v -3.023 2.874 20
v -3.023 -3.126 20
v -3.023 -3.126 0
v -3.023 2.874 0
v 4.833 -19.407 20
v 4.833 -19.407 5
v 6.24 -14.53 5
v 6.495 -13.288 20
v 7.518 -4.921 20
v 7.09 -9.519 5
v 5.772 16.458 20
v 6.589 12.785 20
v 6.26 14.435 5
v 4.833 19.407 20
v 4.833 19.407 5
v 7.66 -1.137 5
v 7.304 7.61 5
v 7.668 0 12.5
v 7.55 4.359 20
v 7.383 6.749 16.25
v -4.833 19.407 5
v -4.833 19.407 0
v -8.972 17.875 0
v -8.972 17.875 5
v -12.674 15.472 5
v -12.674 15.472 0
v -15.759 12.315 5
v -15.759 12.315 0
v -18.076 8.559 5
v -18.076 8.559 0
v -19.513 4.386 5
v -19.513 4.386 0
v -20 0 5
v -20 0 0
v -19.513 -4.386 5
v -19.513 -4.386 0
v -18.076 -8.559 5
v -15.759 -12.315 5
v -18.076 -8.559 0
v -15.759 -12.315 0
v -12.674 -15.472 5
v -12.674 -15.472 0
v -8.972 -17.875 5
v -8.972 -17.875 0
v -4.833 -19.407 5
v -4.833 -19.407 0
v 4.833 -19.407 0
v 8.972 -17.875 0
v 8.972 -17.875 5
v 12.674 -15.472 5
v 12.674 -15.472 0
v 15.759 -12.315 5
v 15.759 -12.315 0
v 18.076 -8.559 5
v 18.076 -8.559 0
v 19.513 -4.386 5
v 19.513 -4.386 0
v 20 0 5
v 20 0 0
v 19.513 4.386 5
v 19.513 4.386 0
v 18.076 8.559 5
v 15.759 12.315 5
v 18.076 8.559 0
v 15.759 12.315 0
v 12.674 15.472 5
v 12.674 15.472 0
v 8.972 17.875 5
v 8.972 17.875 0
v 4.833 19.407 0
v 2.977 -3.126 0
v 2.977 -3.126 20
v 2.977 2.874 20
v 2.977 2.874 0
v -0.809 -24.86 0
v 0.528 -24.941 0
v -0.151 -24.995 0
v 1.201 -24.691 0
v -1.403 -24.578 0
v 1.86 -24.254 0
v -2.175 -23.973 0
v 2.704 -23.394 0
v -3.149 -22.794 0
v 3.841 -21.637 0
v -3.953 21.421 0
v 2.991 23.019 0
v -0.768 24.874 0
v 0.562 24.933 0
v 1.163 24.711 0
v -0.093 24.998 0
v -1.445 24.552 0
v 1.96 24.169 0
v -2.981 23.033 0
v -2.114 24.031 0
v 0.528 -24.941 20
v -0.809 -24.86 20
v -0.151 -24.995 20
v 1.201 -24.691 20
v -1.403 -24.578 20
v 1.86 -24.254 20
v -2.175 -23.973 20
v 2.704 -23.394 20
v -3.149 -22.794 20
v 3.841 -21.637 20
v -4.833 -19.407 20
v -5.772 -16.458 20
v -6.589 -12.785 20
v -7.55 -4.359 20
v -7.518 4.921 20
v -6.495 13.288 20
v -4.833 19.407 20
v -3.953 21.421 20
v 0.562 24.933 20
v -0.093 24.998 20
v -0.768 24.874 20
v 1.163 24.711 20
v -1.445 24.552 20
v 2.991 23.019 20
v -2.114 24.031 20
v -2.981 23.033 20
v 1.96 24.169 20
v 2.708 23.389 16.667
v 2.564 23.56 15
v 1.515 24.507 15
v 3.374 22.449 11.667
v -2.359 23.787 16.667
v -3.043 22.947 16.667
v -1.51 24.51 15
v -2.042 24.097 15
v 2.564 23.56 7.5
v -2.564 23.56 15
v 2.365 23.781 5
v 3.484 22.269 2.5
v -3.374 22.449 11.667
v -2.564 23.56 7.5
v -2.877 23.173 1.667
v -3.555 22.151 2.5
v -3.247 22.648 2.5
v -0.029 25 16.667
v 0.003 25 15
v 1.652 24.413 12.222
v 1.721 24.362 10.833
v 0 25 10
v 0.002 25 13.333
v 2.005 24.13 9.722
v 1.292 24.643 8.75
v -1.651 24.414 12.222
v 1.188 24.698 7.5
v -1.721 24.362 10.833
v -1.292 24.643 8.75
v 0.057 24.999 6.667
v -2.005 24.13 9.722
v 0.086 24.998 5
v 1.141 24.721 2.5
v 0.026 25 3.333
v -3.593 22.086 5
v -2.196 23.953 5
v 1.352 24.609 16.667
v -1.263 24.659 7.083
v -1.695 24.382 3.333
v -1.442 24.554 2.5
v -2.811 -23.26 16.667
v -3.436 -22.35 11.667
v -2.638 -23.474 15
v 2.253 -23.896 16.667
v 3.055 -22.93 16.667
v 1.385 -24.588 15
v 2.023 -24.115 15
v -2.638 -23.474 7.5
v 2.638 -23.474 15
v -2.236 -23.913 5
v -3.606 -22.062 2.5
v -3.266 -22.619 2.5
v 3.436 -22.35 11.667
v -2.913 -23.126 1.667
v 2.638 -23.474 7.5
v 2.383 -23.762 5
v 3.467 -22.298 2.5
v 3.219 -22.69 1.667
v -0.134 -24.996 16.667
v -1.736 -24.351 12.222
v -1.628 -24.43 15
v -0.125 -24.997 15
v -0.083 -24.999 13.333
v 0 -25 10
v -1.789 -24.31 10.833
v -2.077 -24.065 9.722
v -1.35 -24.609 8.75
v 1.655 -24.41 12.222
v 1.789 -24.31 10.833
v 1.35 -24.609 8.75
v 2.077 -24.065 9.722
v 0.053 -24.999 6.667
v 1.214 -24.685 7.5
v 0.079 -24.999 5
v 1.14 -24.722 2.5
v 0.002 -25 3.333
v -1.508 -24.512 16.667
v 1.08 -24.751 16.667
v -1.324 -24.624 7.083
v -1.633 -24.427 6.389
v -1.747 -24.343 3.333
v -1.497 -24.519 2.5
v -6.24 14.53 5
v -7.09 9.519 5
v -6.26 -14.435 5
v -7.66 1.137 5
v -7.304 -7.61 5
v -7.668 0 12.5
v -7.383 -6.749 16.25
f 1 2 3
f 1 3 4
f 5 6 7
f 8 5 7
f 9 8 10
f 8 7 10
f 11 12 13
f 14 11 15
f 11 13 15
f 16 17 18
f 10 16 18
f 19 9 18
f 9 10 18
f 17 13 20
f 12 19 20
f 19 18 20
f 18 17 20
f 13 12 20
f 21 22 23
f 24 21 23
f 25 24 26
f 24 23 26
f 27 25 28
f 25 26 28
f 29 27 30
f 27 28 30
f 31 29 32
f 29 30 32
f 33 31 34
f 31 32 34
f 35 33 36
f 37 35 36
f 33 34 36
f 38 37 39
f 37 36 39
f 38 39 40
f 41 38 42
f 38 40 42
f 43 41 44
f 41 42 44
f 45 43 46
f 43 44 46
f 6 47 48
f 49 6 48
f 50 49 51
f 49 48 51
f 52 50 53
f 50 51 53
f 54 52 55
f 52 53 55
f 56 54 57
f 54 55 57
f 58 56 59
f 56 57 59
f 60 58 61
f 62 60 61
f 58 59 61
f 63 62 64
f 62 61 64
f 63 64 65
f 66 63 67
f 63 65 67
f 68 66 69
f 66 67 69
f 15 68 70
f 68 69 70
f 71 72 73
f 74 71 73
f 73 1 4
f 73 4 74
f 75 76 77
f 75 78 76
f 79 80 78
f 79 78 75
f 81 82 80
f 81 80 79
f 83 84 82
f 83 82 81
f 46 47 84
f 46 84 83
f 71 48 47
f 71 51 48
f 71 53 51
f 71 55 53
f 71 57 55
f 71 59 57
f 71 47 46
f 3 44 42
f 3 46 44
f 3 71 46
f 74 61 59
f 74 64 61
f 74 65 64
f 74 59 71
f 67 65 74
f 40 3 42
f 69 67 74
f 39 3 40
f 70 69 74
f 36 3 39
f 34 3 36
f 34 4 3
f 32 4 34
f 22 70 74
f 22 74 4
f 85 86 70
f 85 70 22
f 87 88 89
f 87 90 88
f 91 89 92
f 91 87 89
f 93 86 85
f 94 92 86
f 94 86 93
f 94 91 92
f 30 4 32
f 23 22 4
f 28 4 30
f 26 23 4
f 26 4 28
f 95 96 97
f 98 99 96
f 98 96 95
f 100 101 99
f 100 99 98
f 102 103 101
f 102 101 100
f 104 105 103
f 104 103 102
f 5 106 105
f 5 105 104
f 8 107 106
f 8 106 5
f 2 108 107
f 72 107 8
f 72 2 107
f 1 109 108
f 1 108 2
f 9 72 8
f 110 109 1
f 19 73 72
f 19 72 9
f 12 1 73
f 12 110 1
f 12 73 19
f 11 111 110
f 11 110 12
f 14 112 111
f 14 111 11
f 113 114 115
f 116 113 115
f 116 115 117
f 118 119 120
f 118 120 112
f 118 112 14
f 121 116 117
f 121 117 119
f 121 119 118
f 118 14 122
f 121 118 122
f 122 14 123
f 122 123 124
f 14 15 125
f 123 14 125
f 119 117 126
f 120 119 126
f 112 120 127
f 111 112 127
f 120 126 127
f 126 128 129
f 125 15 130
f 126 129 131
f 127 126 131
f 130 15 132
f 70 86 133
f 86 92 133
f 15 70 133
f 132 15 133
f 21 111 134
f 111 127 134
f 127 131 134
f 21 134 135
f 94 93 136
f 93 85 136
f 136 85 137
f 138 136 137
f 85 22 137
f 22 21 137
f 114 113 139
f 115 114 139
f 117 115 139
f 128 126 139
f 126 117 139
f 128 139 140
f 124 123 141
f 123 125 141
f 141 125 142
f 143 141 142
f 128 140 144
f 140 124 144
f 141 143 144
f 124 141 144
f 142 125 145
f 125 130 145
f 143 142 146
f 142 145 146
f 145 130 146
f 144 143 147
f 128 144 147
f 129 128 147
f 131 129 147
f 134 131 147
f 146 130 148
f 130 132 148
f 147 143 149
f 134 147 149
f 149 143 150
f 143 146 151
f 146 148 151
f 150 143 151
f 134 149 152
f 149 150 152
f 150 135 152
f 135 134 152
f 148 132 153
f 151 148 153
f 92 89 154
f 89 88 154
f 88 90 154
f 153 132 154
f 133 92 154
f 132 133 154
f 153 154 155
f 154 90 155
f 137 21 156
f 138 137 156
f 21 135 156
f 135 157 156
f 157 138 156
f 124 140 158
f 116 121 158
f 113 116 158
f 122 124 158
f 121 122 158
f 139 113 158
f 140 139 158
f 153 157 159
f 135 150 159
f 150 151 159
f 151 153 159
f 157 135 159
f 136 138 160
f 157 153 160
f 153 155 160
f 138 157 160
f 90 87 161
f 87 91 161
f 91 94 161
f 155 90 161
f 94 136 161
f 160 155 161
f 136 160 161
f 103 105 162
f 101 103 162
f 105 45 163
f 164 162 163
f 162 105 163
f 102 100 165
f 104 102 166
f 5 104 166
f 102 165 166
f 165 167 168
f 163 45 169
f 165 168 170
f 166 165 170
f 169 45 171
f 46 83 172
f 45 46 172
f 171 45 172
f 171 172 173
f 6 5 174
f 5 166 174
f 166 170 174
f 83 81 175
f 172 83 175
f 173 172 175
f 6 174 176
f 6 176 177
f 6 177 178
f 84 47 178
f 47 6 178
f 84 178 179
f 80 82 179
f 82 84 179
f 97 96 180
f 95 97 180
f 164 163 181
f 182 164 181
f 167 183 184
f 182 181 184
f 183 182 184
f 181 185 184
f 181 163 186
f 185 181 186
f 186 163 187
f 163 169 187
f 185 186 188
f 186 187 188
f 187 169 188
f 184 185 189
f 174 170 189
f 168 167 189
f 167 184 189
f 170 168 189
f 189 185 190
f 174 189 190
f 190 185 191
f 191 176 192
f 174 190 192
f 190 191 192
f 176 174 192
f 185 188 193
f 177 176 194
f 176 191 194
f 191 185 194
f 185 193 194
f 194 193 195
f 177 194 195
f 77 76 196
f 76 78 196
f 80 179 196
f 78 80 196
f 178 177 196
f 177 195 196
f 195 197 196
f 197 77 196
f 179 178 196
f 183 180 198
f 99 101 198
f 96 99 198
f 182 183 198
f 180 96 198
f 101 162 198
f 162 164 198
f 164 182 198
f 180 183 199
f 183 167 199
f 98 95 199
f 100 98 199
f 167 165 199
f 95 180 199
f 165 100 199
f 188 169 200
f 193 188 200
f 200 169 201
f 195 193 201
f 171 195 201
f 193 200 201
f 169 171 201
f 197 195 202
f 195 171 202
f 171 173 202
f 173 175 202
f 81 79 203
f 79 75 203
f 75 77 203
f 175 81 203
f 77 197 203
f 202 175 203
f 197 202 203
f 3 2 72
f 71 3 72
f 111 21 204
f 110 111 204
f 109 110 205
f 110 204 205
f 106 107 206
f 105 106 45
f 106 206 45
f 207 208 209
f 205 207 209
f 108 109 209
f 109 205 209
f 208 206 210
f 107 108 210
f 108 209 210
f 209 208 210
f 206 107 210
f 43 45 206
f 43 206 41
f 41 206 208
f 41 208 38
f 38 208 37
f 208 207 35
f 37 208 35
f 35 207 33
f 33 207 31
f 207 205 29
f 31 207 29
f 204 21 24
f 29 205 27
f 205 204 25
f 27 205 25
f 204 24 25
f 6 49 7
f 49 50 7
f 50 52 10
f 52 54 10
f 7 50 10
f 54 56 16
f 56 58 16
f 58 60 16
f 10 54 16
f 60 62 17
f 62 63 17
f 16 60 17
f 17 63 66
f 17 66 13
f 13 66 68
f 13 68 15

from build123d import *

# Parameters (mm, degrees)
F0_W     = 6
F0_H     = 6
F1_DEPTH = 20
F2_DEPTH = 5


with BuildPart() as f1:
    # F0 (on Top) → F1 (new body)
    with BuildSketch(Plane.XY):
        with BuildLine():
            add(Edge.make_bspline(
                [(0, 25), (-2.721114, 25), (-4.833477, 19.407151)],
                knots=[0, 0, 0, 0.682044, 0.682044, 0.682044], degree=2, weights=[1, 0.942413, 1]))
            add(Edge.make_bspline(
                [(-4.833477, 19.407151), (-12.163362, 0), (-4.833477, -19.407151)],
                knots=[0.682044, 0.682044, 0.682044, 2.459549, 2.459549, 2.459549], degree=2, weights=[1, 0.630381, 1]))
            add(Edge.make_bspline(
                [(-4.833477, -19.407151), (0, -32.204624), (4.833477, -19.407151)],
                knots=[2.459549, 2.459549, 2.459549, 3.823636, 3.823636, 3.823636], degree=2, weights=[1, 0.776286, 1]))
            add(Edge.make_bspline(
                [(4.833477, -19.407151), (12.163362, 0), (4.833477, 19.407151)],
                knots=[3.823636, 3.823636, 3.823636, 5.601142, 5.601142, 5.601142], degree=2, weights=[1, 0.630381, 1]))
            add(Edge.make_bspline(
                [(4.833477, 19.407151), (2.721114, 25), (0, 25)],
                knots=[5.601142, 5.601142, 5.601142, 6.283185, 6.283185, 6.283185], degree=2, weights=[1, 0.942413, 1]))
        make_face()
        with Locations((-0.022681, -0.126182)):
            Rectangle(F0_W, F0_H, mode=Mode.SUBTRACT)
    extrude(amount=F1_DEPTH)

    # F0 (on Top) → F2 (join)
    with BuildSketch(Plane.XY):
        with BuildLine():
            add(Edge.make_bspline(
                [(-4.833477, 19.407151), (-12.163362, 0), (-4.833477, -19.407151)],
                knots=[0.682044, 0.682044, 0.682044, 2.459549, 2.459549, 2.459549], degree=2, weights=[1, 0.630381, 1]))
            ThreePointArc((-4.833477, 19.407151), (-20, 0), (-4.833477, -19.407151))
        make_face()
        with BuildLine():
            add(Edge.make_bspline(
                [(0, 25), (-2.721114, 25), (-4.833477, 19.407151)],
                knots=[0, 0, 0, 0.682044, 0.682044, 0.682044], degree=2, weights=[1, 0.942413, 1]))
            add(Edge.make_bspline(
                [(-4.833477, 19.407151), (-12.163362, 0), (-4.833477, -19.407151)],
                knots=[0.682044, 0.682044, 0.682044, 2.459549, 2.459549, 2.459549], degree=2, weights=[1, 0.630381, 1]))
            add(Edge.make_bspline(
                [(-4.833477, -19.407151), (0, -32.204624), (4.833477, -19.407151)],
                knots=[2.459549, 2.459549, 2.459549, 3.823636, 3.823636, 3.823636], degree=2, weights=[1, 0.776286, 1]))
            add(Edge.make_bspline(
                [(4.833477, -19.407151), (12.163362, 0), (4.833477, 19.407151)],
                knots=[3.823636, 3.823636, 3.823636, 5.601142, 5.601142, 5.601142], degree=2, weights=[1, 0.630381, 1]))
            add(Edge.make_bspline(
                [(4.833477, 19.407151), (2.721114, 25), (0, 25)],
                knots=[5.601142, 5.601142, 5.601142, 6.283185, 6.283185, 6.283185], degree=2, weights=[1, 0.942413, 1]))
        make_face()
        with Locations((-0.022681, -0.126182)):
            Rectangle(F0_W, F0_H, mode=Mode.SUBTRACT)
        with BuildLine():
            add(Edge.make_bspline(
                [(4.833477, -19.407151), (12.163362, 0), (4.833477, 19.407151)],
                knots=[3.823636, 3.823636, 3.823636, 5.601142, 5.601142, 5.601142], degree=2, weights=[1, 0.630381, 1]))
            ThreePointArc((4.833477, -19.407151), (20, 0), (4.833477, 19.407151))
        make_face()
    extrude(amount=F2_DEPTH)


solid = f1.part
